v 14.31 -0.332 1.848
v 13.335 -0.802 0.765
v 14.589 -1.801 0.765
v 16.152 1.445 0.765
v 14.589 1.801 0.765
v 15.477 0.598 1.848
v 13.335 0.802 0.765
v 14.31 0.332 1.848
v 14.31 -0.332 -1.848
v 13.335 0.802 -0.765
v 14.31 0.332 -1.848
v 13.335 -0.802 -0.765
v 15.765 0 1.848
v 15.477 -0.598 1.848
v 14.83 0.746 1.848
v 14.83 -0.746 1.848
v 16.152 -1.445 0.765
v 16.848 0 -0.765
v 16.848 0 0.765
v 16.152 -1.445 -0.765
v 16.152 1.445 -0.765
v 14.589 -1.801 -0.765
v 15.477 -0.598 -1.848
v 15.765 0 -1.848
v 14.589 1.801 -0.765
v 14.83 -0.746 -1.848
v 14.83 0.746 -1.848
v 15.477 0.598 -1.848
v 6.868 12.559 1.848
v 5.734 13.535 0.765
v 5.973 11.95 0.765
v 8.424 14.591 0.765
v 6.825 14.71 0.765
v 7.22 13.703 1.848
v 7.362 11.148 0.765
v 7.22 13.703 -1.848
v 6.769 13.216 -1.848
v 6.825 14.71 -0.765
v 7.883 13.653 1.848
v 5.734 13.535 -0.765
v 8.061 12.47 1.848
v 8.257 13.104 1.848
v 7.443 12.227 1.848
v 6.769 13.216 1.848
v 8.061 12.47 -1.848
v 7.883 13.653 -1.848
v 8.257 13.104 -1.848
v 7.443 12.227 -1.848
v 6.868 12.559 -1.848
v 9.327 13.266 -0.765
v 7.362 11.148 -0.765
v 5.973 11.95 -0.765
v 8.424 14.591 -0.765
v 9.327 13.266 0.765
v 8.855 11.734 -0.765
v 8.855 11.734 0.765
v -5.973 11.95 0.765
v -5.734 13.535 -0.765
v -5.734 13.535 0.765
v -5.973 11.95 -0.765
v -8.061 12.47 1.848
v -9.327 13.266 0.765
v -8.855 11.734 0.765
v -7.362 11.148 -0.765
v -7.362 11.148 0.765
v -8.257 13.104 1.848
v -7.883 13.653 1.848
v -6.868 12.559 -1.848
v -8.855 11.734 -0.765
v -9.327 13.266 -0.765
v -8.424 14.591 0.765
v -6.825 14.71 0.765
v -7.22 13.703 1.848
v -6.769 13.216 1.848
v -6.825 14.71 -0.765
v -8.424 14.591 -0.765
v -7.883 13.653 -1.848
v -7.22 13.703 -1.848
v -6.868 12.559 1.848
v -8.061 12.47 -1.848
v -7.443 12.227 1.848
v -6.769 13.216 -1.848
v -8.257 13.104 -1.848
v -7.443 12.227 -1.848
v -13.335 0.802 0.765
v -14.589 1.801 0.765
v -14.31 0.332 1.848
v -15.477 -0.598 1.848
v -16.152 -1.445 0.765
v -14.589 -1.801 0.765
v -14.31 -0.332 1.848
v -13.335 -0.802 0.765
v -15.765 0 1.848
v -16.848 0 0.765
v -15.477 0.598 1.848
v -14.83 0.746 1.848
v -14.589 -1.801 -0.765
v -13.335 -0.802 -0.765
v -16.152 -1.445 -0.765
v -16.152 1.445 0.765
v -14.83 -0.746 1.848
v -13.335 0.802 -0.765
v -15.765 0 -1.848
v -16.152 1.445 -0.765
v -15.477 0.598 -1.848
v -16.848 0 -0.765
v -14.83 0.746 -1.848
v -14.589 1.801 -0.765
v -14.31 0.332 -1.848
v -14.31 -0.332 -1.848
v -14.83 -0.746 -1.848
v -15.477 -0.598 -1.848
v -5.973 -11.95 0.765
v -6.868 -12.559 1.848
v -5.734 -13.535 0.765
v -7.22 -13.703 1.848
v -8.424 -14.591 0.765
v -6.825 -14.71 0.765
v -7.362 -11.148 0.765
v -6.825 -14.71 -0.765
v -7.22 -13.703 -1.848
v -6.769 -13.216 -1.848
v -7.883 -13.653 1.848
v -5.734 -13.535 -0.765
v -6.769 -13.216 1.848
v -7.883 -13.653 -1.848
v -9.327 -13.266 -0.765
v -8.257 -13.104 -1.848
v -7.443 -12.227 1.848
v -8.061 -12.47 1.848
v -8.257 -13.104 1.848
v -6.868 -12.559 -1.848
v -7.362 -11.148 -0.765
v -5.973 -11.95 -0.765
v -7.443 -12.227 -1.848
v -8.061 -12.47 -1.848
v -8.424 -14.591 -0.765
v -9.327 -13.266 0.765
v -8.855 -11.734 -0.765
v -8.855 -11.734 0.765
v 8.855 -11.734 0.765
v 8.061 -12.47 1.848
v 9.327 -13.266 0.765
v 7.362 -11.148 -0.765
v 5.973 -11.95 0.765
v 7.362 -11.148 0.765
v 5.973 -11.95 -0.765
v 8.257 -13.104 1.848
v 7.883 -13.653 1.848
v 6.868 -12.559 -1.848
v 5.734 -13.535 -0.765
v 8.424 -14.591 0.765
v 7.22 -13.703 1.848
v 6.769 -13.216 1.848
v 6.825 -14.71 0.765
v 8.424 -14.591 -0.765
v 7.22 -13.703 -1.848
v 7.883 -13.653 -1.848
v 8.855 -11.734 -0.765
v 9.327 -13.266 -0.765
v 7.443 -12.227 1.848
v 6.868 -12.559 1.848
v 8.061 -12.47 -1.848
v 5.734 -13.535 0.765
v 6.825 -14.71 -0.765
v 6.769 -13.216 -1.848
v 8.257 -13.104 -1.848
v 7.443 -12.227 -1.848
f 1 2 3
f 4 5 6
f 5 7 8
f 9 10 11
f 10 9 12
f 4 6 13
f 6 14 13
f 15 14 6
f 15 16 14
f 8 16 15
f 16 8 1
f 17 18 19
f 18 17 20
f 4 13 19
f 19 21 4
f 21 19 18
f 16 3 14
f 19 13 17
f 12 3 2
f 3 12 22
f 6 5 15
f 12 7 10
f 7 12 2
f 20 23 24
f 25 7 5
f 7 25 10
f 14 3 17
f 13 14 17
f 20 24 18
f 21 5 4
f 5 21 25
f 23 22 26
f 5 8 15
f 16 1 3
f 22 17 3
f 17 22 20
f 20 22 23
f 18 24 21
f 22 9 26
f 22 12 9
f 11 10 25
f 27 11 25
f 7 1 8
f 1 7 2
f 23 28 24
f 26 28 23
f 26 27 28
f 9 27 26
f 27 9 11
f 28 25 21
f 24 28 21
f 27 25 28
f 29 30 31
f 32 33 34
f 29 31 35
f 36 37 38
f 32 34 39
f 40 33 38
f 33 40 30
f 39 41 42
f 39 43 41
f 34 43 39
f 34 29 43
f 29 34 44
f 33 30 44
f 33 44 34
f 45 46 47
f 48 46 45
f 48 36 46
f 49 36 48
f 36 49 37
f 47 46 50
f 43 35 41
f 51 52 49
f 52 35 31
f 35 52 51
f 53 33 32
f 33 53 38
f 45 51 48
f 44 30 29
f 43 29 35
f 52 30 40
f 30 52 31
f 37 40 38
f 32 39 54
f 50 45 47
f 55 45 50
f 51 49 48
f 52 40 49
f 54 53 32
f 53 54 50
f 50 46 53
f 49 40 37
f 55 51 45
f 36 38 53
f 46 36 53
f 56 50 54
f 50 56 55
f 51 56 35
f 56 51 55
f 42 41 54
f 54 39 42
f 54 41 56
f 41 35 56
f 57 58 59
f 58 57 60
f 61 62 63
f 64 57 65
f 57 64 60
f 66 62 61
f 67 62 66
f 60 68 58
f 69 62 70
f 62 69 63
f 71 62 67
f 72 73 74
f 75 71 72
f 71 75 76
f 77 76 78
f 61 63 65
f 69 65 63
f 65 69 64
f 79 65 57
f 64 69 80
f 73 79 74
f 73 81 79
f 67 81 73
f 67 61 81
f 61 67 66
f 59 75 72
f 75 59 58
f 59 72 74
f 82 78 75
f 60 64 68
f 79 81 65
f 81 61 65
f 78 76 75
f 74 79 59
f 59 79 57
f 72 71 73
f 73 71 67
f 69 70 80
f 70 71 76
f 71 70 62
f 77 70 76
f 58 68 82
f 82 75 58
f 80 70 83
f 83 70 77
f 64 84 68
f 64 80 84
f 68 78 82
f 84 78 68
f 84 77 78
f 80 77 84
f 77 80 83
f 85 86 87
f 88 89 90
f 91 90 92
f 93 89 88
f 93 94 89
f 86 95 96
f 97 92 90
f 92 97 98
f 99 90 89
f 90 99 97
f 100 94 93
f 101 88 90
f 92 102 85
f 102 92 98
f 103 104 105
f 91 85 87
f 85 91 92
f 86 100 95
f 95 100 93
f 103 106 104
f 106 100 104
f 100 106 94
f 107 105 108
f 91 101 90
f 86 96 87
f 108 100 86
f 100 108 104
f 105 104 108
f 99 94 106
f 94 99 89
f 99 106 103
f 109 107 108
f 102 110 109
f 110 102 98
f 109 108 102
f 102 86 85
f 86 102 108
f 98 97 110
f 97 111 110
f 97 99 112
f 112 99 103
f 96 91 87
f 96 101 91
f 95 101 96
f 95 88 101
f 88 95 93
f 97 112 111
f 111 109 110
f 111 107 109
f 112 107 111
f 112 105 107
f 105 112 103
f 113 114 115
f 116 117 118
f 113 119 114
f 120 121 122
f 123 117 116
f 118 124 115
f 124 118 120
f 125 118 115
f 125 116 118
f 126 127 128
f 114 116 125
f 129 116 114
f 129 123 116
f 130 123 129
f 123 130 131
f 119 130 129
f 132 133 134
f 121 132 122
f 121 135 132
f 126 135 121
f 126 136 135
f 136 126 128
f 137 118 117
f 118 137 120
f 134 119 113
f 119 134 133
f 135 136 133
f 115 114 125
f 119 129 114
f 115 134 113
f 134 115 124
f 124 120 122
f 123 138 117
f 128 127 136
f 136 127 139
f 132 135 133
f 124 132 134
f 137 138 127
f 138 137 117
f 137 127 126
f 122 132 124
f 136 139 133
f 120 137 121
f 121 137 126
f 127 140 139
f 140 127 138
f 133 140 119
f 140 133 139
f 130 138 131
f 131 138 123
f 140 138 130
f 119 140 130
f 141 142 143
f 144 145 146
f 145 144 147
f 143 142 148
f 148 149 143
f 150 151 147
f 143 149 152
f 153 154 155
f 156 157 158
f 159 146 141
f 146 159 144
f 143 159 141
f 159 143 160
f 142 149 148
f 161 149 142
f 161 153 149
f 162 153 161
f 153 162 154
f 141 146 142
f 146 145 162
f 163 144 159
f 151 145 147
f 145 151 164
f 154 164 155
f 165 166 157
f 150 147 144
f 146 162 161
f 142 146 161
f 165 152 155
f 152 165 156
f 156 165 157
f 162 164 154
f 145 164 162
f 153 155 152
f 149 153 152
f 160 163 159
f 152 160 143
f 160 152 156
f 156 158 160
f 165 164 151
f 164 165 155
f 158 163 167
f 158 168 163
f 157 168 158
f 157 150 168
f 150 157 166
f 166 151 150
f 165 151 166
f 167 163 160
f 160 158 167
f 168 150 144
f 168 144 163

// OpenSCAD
// User functions + list comprehension style ranges
function area(r) = 3.14159 * r * r;

r = 5;
echo(area(r)); // no-op but parsed

for (a = [0 : 60 : 300]) {
    rotate([0, 0, a])
        translate([15, 0, 0])
            sphere(r = 2);
}
